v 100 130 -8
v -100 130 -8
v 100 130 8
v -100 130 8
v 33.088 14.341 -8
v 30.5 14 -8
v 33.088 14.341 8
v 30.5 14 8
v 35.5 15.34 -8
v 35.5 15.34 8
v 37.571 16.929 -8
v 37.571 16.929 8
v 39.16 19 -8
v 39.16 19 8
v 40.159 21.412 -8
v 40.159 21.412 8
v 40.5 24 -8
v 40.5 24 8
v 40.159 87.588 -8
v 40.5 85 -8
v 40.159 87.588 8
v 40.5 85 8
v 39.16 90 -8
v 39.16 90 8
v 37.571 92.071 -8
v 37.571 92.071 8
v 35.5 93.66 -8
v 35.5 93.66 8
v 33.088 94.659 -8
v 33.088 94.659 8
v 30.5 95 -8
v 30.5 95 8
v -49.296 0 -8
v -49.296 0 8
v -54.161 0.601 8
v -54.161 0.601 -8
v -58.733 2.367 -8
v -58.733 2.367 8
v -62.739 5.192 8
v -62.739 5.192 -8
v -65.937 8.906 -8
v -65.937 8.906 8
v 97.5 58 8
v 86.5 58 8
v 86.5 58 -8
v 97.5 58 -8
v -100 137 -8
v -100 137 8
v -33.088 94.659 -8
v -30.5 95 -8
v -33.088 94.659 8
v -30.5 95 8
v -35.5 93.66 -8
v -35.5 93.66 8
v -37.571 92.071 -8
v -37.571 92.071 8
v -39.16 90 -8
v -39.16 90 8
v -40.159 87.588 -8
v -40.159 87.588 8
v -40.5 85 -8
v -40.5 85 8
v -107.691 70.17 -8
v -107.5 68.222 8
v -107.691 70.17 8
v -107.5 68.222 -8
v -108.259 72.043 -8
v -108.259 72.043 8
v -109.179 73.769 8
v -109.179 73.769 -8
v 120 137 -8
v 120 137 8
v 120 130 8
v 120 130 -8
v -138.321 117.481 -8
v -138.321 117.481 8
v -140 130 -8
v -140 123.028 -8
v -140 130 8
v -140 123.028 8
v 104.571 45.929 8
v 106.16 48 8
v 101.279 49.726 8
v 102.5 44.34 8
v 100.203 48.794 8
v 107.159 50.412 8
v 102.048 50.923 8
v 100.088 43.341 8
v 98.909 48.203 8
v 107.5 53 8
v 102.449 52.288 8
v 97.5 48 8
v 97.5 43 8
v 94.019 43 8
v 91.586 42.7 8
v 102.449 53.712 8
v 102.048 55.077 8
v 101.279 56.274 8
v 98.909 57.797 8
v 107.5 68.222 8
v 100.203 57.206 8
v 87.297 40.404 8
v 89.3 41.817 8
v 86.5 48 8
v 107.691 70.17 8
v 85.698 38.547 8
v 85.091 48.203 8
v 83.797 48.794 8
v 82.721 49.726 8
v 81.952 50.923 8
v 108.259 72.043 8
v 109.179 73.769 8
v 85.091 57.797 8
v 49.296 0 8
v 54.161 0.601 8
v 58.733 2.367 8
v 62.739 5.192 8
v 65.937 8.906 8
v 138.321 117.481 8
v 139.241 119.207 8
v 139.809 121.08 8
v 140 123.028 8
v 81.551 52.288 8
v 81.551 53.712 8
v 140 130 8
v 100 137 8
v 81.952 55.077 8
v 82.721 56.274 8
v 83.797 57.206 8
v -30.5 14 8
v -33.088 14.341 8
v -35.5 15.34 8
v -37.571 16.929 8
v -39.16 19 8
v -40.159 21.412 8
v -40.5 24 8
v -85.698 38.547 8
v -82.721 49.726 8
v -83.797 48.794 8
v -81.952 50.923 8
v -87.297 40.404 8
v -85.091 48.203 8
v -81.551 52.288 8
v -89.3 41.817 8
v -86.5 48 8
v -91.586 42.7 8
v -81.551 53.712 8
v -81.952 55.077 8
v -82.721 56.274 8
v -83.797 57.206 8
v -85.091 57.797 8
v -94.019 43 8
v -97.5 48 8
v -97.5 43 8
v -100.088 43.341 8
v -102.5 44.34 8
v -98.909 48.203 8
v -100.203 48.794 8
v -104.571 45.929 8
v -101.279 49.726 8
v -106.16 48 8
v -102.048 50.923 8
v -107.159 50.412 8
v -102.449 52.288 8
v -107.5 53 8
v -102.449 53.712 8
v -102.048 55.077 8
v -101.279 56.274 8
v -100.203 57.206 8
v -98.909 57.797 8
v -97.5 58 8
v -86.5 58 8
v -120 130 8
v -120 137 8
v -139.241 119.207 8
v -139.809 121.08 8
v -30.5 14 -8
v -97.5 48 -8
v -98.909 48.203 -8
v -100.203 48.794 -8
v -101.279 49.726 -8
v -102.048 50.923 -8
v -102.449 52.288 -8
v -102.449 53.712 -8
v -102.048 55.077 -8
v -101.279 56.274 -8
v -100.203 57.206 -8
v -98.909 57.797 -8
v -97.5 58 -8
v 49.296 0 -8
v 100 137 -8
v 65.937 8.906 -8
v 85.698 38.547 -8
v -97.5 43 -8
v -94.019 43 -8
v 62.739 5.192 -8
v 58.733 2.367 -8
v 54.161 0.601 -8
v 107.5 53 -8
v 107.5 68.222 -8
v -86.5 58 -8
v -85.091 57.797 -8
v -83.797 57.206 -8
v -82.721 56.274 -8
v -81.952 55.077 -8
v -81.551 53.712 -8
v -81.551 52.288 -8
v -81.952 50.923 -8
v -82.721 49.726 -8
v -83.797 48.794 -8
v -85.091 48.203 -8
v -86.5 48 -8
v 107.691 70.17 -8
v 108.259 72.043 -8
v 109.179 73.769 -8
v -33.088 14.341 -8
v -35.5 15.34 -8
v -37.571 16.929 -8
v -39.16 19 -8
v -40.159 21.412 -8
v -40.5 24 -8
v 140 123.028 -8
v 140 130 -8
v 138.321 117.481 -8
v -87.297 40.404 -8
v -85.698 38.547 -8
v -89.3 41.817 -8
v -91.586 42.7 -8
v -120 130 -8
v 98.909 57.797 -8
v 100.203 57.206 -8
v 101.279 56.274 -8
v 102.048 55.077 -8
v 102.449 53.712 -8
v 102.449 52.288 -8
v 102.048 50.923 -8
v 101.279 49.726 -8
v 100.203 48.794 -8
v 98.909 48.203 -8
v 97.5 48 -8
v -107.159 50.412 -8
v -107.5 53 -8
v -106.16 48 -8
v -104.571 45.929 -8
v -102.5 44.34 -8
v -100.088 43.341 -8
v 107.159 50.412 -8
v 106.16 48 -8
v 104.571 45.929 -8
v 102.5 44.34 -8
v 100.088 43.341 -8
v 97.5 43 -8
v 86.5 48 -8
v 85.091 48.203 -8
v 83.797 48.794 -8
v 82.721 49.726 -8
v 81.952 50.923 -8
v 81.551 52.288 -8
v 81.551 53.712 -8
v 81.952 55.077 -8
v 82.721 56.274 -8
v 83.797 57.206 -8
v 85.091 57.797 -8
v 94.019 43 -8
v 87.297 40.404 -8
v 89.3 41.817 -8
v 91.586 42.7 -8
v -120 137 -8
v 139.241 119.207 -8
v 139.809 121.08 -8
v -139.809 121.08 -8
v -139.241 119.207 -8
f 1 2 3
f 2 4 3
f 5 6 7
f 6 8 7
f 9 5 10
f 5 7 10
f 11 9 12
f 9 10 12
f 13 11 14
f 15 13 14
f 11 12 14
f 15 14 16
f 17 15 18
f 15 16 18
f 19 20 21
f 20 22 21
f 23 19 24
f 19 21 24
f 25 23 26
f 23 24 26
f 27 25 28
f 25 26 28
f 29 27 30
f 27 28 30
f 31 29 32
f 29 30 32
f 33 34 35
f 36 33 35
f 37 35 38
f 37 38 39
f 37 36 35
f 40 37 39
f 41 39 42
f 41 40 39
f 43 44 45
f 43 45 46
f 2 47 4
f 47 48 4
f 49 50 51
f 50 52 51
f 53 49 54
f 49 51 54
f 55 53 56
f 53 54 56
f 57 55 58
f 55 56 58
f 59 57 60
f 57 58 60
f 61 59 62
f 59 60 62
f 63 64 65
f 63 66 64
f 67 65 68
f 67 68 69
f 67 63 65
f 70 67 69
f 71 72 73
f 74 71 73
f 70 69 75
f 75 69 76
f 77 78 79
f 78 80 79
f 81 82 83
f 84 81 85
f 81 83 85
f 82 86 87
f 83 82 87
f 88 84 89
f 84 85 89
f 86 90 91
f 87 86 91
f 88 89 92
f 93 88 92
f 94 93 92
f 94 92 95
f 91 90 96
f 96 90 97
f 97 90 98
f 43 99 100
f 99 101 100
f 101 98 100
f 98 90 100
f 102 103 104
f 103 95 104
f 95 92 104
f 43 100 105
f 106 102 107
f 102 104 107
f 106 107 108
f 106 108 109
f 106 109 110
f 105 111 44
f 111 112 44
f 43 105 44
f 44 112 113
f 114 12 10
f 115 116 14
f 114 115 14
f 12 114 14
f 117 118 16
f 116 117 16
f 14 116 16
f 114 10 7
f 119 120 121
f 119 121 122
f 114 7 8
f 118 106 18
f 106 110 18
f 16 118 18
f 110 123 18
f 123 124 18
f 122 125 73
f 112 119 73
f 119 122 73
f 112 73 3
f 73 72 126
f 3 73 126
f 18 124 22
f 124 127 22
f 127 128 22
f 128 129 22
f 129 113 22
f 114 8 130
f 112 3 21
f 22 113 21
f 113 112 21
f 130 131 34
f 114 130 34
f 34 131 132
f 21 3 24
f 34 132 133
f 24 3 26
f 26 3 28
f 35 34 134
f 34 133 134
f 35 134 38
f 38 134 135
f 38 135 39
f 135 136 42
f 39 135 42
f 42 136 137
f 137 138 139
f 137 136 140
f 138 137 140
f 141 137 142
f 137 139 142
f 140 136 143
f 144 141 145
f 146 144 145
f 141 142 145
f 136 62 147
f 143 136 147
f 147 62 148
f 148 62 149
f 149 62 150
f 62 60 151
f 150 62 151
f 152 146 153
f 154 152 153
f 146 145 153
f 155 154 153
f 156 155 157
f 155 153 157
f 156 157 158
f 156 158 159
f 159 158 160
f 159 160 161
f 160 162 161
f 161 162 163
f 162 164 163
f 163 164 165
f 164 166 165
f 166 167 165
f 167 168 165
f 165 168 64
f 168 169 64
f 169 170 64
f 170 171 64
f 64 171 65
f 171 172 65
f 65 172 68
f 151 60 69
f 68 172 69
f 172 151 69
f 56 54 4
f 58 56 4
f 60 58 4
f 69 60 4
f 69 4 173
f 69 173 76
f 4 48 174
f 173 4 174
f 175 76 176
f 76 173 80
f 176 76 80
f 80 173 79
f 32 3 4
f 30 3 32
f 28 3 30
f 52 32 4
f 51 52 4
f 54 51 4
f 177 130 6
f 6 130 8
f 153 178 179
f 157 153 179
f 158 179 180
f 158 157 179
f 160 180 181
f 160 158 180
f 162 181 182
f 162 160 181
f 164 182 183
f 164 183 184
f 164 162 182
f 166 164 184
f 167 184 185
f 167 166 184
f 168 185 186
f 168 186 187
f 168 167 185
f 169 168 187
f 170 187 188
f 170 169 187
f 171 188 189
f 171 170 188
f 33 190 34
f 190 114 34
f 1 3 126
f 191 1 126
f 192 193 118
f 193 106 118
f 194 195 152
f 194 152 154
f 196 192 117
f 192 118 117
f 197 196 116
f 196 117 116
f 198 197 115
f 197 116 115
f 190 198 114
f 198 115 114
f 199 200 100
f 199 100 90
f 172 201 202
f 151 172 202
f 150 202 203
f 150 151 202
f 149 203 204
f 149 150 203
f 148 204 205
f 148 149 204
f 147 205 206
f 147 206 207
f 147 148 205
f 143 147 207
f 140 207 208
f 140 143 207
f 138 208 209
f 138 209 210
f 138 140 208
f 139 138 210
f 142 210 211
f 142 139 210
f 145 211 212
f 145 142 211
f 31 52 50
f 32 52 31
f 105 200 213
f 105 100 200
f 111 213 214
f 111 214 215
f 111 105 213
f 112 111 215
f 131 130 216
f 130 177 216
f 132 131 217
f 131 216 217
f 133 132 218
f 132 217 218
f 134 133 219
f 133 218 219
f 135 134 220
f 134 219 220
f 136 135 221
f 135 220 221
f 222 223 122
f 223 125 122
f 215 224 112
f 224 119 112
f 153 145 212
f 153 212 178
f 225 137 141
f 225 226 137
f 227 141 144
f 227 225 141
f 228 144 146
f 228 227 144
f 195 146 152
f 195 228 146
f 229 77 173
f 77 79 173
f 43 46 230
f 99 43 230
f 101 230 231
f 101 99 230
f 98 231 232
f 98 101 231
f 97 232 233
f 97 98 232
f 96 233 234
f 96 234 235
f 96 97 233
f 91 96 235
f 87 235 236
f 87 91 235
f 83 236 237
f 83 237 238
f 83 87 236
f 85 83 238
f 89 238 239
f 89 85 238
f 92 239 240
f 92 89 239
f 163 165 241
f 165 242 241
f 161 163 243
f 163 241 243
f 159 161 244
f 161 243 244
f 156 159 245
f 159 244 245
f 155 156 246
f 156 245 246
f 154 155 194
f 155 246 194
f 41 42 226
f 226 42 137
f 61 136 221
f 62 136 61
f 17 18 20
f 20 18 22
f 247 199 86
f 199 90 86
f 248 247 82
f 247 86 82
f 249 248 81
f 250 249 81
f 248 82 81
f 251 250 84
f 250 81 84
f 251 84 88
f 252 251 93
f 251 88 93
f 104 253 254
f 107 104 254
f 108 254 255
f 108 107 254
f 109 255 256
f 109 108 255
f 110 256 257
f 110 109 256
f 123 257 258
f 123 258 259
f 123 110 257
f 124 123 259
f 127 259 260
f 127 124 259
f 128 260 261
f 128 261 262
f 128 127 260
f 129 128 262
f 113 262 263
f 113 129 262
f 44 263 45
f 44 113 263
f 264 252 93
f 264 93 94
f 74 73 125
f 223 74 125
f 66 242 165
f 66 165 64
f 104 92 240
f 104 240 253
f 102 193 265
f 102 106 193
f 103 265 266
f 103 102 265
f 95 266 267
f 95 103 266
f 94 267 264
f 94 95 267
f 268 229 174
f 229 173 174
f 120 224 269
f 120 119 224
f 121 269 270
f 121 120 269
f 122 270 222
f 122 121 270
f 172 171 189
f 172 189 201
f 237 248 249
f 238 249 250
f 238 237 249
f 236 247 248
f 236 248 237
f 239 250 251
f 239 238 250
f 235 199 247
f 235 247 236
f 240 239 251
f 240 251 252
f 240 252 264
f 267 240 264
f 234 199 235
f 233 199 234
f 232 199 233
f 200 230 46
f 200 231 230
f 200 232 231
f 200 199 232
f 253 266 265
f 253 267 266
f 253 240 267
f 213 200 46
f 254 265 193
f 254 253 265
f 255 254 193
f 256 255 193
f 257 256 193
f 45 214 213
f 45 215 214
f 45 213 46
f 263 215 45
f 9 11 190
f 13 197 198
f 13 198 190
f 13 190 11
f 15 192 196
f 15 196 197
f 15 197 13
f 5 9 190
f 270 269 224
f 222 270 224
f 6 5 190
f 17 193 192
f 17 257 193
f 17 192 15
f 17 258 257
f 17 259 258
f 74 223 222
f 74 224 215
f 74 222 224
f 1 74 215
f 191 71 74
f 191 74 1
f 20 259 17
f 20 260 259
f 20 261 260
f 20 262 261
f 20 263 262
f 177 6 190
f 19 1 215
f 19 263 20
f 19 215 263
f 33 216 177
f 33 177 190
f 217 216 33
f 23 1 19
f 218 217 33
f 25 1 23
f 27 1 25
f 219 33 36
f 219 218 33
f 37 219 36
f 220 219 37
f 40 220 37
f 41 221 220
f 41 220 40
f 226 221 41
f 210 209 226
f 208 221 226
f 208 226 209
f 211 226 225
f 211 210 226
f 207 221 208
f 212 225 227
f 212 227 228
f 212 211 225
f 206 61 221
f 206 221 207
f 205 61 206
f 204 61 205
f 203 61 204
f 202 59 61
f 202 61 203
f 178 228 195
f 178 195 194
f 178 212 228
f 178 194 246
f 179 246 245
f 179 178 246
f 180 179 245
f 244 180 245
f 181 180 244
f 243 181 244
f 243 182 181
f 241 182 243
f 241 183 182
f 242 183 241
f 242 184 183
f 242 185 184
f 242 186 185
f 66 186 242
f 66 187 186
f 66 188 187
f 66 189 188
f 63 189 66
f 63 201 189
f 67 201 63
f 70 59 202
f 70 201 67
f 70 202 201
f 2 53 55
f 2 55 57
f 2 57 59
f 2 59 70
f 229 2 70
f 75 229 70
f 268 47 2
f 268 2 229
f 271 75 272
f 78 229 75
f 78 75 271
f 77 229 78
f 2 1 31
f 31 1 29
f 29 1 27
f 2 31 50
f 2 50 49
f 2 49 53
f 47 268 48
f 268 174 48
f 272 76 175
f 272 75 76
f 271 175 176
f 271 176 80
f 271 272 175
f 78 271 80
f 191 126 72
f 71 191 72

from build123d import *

# Parameters (mm, degrees)
SKETCH_1_W          = 81
SKETCH_1_H          = 81
EXTRUDE_1_DEPTH     = 8
FILLET_1_R          = 10
CUT_EXTRUDE_1_DEPTH = 16
FILLET_2_R          = 20
FILLET_3_R          = 10


with BuildPart() as part:
    # 草图1 → 凸台-拉伸1 (new, symmetric)
    with BuildSketch(Plane.XY):
        Polygon((60, 0), (-60, 0), (-88.666666667, 43), (-107.5, 43), (-107.5, 71.25), (-140, 120), (-140, 130), (-120, 130), (-120, 137), (-100, 137), (-100, 130), (100, 130), (100, 137), (120, 137), (120, 130), (140, 130), (140, 120), (107.5, 71.25), (107.5, 43), (88.666666667, 43), align=None)
        with Locations((0, 54.5)):
            Rectangle(SKETCH_1_W, SKETCH_1_H, mode=Mode.SUBTRACT)
    extrude(amount=EXTRUDE_1_DEPTH, both=True)

    # 圆角1
    fillet_1_edges = [part.edges().sort_by_distance(p)[0] for p in [
        (-107.5, 43, 0),
        (107.5, 43, 0),
        (40.5, 14, 0),
        (40.5, 95, 0),
        (-40.5, 95, 0),
        (-40.5, 14, 0),
    ]]
    fillet(fillet_1_edges, radius=FILLET_1_R)

    # 草图2 → 切除-拉伸1 (cut)
    with BuildSketch(Plane.XY.offset(8)):
        with BuildLine():
            Line((-97.5, 58), (-86.5, 58))
            ThreePointArc((-86.5, 58), (-81.5, 53), (-86.5, 48))
            Line((-86.5, 48), (-97.5, 48))
            ThreePointArc((-97.5, 48), (-102.5, 53), (-97.5, 58))
        make_face()
        with BuildLine():
            Line((97.5, 48), (86.5, 48))
            ThreePointArc((86.5, 48), (81.5, 53), (86.5, 58))
            Line((86.5, 58), (97.5, 58))
            ThreePointArc((97.5, 58), (102.5, 53), (97.5, 48))
        make_face()
    extrude(amount=-CUT_EXTRUDE_1_DEPTH, mode=Mode.SUBTRACT)

    # 圆角2
    fillet_2_edges = [part.edges().sort_by_distance(p)[0] for p in [
        (60, 0, 0),
        (-60, 0, 0),
    ]]
    fillet(fillet_2_edges, radius=FILLET_2_R)

    # 圆角3
    fillet_3_edges = [part.edges().sort_by_distance(p)[0] for p in [
        (-88.666666667, 43, 0),
        (-107.5, 71.25, 0),
        (-140, 120, 0),
        (140, 120, 0),
        (107.5, 71.25, 0),
        (88.666666667, 43, 0),
    ]]
    fillet(fillet_3_edges, radius=FILLET_3_R)


solid = part.part
